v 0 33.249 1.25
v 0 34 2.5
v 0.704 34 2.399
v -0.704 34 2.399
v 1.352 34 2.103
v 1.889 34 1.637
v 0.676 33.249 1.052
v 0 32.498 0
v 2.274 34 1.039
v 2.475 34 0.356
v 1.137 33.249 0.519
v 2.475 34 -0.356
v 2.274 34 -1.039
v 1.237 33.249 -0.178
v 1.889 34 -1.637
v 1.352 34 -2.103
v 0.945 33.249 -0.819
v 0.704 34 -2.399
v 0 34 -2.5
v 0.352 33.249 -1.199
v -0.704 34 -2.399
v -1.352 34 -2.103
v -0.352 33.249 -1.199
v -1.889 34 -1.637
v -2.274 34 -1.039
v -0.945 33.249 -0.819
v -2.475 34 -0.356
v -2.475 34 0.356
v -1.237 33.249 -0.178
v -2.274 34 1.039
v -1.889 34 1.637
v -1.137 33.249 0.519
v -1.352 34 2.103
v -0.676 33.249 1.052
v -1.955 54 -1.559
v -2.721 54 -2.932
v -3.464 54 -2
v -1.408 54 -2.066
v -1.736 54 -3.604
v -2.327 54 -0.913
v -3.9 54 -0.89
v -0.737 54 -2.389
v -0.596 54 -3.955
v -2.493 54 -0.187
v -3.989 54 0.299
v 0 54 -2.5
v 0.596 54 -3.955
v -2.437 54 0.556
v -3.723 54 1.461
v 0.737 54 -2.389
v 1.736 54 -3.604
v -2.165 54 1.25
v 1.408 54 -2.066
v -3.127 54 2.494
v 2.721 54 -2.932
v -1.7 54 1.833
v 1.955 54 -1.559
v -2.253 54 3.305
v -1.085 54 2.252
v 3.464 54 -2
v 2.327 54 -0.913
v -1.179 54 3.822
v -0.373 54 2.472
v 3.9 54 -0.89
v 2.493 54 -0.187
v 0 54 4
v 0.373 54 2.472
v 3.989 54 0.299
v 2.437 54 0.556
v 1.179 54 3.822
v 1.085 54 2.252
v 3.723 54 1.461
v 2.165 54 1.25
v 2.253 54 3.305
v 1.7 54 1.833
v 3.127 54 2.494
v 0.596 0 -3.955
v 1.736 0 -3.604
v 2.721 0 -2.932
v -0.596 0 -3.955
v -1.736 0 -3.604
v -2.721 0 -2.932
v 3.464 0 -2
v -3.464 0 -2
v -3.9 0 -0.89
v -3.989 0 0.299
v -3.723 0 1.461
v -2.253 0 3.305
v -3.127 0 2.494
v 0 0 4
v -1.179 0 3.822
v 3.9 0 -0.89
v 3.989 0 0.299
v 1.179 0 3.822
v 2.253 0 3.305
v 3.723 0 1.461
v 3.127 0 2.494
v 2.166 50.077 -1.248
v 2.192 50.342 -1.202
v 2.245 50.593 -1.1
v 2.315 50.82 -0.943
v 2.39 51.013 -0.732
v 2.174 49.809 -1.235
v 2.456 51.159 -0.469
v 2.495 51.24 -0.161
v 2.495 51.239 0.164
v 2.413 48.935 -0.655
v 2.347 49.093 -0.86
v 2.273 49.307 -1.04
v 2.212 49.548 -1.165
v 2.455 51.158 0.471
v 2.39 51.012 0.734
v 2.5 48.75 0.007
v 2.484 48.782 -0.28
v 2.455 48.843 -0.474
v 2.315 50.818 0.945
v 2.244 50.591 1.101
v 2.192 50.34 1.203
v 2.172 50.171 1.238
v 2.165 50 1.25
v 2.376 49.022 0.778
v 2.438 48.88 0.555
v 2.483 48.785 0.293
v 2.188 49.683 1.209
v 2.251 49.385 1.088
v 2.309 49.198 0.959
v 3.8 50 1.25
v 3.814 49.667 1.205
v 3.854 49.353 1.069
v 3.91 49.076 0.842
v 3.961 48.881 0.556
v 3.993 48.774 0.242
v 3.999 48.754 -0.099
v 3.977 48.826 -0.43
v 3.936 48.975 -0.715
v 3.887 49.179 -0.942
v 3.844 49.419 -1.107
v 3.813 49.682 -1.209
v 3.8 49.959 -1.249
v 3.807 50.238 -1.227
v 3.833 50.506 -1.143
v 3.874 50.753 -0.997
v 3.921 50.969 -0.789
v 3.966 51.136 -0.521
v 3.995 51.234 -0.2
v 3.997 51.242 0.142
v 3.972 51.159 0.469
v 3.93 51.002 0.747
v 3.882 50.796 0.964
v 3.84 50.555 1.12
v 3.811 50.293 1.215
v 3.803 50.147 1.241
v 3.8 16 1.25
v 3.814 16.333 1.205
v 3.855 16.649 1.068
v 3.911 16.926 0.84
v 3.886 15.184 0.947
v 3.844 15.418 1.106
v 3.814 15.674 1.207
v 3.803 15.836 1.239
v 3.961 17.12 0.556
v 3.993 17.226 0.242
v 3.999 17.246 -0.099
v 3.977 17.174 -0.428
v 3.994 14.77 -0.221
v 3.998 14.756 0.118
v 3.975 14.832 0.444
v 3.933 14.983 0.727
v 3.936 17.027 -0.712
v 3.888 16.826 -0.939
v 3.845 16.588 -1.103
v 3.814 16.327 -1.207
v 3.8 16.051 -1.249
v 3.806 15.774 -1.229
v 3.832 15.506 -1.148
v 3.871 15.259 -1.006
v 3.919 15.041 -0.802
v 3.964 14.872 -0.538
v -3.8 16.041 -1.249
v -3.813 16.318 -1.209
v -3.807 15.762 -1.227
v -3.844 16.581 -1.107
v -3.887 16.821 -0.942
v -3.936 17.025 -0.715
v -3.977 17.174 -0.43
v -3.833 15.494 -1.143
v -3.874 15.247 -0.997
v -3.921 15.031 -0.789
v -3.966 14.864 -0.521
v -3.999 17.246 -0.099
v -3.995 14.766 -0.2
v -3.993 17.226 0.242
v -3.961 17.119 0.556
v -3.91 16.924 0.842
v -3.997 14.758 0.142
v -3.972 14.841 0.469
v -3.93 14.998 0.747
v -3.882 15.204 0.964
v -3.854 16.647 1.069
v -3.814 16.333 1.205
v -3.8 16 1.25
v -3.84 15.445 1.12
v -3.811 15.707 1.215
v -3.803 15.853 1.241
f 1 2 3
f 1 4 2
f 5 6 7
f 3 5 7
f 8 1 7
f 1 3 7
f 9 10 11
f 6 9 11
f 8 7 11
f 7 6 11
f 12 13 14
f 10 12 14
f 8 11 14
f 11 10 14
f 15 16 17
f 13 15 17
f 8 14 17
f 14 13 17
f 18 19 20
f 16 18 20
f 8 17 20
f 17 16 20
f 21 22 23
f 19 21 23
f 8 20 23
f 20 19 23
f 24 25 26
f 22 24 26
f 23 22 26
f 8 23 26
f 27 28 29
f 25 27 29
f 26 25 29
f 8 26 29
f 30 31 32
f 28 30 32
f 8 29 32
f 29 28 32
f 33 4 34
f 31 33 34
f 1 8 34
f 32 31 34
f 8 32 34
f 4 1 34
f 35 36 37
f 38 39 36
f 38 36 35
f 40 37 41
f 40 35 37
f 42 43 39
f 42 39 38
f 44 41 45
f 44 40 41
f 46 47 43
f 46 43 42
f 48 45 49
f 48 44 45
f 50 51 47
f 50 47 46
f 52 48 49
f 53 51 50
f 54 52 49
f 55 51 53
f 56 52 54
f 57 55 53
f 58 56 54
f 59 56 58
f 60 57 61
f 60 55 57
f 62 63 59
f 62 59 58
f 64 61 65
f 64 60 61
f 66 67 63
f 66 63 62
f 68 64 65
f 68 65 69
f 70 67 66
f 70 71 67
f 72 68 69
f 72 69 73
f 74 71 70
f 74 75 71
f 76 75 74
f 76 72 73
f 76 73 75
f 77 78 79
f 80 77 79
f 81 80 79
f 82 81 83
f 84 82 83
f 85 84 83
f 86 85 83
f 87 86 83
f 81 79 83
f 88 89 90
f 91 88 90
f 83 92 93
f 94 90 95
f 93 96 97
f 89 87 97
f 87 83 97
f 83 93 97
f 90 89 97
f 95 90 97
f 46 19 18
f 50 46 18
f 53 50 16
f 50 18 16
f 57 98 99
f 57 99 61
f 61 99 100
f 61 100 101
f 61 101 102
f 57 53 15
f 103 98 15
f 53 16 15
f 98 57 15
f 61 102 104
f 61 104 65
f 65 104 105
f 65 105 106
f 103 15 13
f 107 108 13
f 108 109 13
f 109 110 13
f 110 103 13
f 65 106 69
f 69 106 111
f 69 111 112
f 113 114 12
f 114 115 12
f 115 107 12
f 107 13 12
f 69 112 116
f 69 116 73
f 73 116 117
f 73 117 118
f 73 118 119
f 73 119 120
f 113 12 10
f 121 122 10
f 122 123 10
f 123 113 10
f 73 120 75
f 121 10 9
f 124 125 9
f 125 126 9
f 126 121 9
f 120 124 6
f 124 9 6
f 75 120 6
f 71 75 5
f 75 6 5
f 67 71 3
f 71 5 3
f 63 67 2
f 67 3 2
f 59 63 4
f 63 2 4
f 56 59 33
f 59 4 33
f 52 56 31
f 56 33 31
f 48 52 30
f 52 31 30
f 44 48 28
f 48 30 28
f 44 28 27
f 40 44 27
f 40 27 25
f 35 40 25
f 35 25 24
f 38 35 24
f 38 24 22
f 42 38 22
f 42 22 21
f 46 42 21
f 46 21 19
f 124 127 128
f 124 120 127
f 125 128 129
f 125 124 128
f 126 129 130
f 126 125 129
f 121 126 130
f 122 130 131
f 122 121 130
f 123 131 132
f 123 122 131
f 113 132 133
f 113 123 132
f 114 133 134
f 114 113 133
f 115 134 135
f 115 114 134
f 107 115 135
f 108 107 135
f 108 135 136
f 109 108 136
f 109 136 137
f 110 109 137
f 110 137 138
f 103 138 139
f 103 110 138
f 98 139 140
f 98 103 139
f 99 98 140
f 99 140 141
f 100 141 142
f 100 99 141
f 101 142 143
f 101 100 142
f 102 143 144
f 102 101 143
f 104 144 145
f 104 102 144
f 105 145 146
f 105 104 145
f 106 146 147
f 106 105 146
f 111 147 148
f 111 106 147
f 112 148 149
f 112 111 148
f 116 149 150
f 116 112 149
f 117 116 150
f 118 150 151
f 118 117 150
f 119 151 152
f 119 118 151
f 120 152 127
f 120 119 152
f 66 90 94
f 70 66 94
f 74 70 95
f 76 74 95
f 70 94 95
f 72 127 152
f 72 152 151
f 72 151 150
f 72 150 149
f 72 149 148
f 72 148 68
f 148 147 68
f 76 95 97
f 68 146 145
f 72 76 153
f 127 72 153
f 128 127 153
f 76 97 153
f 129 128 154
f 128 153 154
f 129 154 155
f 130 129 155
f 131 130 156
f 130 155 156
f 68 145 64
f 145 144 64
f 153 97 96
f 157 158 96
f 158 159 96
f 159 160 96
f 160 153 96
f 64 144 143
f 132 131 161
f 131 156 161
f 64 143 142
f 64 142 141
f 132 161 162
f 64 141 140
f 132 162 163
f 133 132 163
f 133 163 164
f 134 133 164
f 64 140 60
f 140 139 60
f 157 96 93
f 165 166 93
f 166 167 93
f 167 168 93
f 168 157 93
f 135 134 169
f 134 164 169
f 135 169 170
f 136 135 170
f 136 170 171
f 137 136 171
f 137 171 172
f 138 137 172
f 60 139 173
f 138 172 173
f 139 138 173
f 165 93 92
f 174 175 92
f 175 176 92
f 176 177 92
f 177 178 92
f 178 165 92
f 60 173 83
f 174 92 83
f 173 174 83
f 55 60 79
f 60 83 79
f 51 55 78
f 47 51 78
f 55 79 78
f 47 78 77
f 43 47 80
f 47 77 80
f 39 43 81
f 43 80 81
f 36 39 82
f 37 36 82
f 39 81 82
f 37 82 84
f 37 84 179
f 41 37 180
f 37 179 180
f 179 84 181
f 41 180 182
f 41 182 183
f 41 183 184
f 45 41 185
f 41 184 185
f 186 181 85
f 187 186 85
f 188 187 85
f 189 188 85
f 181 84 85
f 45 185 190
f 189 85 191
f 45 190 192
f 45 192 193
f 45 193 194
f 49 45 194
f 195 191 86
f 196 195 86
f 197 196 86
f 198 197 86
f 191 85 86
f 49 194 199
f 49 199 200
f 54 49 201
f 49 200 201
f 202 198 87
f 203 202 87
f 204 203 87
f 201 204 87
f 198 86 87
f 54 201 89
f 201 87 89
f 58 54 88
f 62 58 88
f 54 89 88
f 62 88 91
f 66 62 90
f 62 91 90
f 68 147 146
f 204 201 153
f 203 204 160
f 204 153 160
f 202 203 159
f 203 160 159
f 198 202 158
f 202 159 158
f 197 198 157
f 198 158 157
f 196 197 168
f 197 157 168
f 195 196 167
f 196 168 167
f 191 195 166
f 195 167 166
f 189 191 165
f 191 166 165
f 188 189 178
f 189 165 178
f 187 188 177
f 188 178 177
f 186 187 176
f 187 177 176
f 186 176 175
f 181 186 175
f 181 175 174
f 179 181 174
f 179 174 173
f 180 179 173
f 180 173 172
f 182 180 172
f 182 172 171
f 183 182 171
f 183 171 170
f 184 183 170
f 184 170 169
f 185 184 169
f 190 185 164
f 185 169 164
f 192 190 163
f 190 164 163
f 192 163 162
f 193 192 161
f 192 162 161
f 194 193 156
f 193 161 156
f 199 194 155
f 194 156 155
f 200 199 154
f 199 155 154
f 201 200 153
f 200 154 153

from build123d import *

# Parameters (mm, degrees)
SKETCH1_R                   = 4
BOSS_EXTRUDE1_DEPTH         = 54
F_5_0MM_DOWEL_HOLE2_D       = 5
F_5_0MM_DOWEL_HOLE2_DEPTH   = 20
F_5_0MM_DOWEL_HOLE2_TIP     = 1.502151548
SKETCH14_W                  = 1.25
SKETCH14_H                  = 4
TAP_DRILL_FOR_M3X0_5_TAP4_D = 2.5


with BuildPart() as part:
    # Sketch1 → Boss-Extrude1 (new body)
    with BuildSketch(Plane(origin=(0, 0, 0), x_dir=(1, 0, 0), z_dir=(0, 1, 0))):
        with Locations(Location((0, 0, 0), (0, 0, 270))):
            Circle(SKETCH1_R)
    extrude(amount=BOSS_EXTRUDE1_DEPTH)

    # Ø5.0mm Dowel Hole2
    with Locations(Plane.ZX.offset(54)):
        with Locations((0, 0)):
            Hole(F_5_0MM_DOWEL_HOLE2_D / 2, depth=F_5_0MM_DOWEL_HOLE2_DEPTH)
            with Locations((0, 0, -(F_5_0MM_DOWEL_HOLE2_DEPTH + F_5_0MM_DOWEL_HOLE2_TIP / 2))):  # 118° drill point
                Cone(0, F_5_0MM_DOWEL_HOLE2_D / 2, F_5_0MM_DOWEL_HOLE2_TIP, mode=Mode.SUBTRACT)

    # Sketch12 → Tap Drill for M3x0.5 Tap2 (revolve, cut)
    with BuildSketch(Plane.ZX.offset(50)):
        Polygon((0, 0), (0, 20.751075774), (1.25, 20), (1.25, 0), align=None)
    revolve(axis=Axis((-6.35, 50, 0), (1, 0, 0)), mode=Mode.SUBTRACT)

    # Sketch14 → Tap Drill for M3x0.5 Tap3 (revolve, cut)
    with BuildSketch(Plane.ZX.offset(16)):
        with Locations((0.625, 2)):
            Rectangle(SKETCH14_W, SKETCH14_H)
    revolve(axis=Axis((-6.35, 16, 0), (1, 0, 0)), mode=Mode.SUBTRACT)

    # Tap Drill for M3x0.5 Tap4 (through all)
    with Locations(Plane(origin=(0, 0, 0), x_dir=(0, 0, -1), z_dir=(1, 0, 0))):
        with Locations((0, 16)):
            Hole(TAP_DRILL_FOR_M3X0_5_TAP4_D / 2)


solid = part.part
